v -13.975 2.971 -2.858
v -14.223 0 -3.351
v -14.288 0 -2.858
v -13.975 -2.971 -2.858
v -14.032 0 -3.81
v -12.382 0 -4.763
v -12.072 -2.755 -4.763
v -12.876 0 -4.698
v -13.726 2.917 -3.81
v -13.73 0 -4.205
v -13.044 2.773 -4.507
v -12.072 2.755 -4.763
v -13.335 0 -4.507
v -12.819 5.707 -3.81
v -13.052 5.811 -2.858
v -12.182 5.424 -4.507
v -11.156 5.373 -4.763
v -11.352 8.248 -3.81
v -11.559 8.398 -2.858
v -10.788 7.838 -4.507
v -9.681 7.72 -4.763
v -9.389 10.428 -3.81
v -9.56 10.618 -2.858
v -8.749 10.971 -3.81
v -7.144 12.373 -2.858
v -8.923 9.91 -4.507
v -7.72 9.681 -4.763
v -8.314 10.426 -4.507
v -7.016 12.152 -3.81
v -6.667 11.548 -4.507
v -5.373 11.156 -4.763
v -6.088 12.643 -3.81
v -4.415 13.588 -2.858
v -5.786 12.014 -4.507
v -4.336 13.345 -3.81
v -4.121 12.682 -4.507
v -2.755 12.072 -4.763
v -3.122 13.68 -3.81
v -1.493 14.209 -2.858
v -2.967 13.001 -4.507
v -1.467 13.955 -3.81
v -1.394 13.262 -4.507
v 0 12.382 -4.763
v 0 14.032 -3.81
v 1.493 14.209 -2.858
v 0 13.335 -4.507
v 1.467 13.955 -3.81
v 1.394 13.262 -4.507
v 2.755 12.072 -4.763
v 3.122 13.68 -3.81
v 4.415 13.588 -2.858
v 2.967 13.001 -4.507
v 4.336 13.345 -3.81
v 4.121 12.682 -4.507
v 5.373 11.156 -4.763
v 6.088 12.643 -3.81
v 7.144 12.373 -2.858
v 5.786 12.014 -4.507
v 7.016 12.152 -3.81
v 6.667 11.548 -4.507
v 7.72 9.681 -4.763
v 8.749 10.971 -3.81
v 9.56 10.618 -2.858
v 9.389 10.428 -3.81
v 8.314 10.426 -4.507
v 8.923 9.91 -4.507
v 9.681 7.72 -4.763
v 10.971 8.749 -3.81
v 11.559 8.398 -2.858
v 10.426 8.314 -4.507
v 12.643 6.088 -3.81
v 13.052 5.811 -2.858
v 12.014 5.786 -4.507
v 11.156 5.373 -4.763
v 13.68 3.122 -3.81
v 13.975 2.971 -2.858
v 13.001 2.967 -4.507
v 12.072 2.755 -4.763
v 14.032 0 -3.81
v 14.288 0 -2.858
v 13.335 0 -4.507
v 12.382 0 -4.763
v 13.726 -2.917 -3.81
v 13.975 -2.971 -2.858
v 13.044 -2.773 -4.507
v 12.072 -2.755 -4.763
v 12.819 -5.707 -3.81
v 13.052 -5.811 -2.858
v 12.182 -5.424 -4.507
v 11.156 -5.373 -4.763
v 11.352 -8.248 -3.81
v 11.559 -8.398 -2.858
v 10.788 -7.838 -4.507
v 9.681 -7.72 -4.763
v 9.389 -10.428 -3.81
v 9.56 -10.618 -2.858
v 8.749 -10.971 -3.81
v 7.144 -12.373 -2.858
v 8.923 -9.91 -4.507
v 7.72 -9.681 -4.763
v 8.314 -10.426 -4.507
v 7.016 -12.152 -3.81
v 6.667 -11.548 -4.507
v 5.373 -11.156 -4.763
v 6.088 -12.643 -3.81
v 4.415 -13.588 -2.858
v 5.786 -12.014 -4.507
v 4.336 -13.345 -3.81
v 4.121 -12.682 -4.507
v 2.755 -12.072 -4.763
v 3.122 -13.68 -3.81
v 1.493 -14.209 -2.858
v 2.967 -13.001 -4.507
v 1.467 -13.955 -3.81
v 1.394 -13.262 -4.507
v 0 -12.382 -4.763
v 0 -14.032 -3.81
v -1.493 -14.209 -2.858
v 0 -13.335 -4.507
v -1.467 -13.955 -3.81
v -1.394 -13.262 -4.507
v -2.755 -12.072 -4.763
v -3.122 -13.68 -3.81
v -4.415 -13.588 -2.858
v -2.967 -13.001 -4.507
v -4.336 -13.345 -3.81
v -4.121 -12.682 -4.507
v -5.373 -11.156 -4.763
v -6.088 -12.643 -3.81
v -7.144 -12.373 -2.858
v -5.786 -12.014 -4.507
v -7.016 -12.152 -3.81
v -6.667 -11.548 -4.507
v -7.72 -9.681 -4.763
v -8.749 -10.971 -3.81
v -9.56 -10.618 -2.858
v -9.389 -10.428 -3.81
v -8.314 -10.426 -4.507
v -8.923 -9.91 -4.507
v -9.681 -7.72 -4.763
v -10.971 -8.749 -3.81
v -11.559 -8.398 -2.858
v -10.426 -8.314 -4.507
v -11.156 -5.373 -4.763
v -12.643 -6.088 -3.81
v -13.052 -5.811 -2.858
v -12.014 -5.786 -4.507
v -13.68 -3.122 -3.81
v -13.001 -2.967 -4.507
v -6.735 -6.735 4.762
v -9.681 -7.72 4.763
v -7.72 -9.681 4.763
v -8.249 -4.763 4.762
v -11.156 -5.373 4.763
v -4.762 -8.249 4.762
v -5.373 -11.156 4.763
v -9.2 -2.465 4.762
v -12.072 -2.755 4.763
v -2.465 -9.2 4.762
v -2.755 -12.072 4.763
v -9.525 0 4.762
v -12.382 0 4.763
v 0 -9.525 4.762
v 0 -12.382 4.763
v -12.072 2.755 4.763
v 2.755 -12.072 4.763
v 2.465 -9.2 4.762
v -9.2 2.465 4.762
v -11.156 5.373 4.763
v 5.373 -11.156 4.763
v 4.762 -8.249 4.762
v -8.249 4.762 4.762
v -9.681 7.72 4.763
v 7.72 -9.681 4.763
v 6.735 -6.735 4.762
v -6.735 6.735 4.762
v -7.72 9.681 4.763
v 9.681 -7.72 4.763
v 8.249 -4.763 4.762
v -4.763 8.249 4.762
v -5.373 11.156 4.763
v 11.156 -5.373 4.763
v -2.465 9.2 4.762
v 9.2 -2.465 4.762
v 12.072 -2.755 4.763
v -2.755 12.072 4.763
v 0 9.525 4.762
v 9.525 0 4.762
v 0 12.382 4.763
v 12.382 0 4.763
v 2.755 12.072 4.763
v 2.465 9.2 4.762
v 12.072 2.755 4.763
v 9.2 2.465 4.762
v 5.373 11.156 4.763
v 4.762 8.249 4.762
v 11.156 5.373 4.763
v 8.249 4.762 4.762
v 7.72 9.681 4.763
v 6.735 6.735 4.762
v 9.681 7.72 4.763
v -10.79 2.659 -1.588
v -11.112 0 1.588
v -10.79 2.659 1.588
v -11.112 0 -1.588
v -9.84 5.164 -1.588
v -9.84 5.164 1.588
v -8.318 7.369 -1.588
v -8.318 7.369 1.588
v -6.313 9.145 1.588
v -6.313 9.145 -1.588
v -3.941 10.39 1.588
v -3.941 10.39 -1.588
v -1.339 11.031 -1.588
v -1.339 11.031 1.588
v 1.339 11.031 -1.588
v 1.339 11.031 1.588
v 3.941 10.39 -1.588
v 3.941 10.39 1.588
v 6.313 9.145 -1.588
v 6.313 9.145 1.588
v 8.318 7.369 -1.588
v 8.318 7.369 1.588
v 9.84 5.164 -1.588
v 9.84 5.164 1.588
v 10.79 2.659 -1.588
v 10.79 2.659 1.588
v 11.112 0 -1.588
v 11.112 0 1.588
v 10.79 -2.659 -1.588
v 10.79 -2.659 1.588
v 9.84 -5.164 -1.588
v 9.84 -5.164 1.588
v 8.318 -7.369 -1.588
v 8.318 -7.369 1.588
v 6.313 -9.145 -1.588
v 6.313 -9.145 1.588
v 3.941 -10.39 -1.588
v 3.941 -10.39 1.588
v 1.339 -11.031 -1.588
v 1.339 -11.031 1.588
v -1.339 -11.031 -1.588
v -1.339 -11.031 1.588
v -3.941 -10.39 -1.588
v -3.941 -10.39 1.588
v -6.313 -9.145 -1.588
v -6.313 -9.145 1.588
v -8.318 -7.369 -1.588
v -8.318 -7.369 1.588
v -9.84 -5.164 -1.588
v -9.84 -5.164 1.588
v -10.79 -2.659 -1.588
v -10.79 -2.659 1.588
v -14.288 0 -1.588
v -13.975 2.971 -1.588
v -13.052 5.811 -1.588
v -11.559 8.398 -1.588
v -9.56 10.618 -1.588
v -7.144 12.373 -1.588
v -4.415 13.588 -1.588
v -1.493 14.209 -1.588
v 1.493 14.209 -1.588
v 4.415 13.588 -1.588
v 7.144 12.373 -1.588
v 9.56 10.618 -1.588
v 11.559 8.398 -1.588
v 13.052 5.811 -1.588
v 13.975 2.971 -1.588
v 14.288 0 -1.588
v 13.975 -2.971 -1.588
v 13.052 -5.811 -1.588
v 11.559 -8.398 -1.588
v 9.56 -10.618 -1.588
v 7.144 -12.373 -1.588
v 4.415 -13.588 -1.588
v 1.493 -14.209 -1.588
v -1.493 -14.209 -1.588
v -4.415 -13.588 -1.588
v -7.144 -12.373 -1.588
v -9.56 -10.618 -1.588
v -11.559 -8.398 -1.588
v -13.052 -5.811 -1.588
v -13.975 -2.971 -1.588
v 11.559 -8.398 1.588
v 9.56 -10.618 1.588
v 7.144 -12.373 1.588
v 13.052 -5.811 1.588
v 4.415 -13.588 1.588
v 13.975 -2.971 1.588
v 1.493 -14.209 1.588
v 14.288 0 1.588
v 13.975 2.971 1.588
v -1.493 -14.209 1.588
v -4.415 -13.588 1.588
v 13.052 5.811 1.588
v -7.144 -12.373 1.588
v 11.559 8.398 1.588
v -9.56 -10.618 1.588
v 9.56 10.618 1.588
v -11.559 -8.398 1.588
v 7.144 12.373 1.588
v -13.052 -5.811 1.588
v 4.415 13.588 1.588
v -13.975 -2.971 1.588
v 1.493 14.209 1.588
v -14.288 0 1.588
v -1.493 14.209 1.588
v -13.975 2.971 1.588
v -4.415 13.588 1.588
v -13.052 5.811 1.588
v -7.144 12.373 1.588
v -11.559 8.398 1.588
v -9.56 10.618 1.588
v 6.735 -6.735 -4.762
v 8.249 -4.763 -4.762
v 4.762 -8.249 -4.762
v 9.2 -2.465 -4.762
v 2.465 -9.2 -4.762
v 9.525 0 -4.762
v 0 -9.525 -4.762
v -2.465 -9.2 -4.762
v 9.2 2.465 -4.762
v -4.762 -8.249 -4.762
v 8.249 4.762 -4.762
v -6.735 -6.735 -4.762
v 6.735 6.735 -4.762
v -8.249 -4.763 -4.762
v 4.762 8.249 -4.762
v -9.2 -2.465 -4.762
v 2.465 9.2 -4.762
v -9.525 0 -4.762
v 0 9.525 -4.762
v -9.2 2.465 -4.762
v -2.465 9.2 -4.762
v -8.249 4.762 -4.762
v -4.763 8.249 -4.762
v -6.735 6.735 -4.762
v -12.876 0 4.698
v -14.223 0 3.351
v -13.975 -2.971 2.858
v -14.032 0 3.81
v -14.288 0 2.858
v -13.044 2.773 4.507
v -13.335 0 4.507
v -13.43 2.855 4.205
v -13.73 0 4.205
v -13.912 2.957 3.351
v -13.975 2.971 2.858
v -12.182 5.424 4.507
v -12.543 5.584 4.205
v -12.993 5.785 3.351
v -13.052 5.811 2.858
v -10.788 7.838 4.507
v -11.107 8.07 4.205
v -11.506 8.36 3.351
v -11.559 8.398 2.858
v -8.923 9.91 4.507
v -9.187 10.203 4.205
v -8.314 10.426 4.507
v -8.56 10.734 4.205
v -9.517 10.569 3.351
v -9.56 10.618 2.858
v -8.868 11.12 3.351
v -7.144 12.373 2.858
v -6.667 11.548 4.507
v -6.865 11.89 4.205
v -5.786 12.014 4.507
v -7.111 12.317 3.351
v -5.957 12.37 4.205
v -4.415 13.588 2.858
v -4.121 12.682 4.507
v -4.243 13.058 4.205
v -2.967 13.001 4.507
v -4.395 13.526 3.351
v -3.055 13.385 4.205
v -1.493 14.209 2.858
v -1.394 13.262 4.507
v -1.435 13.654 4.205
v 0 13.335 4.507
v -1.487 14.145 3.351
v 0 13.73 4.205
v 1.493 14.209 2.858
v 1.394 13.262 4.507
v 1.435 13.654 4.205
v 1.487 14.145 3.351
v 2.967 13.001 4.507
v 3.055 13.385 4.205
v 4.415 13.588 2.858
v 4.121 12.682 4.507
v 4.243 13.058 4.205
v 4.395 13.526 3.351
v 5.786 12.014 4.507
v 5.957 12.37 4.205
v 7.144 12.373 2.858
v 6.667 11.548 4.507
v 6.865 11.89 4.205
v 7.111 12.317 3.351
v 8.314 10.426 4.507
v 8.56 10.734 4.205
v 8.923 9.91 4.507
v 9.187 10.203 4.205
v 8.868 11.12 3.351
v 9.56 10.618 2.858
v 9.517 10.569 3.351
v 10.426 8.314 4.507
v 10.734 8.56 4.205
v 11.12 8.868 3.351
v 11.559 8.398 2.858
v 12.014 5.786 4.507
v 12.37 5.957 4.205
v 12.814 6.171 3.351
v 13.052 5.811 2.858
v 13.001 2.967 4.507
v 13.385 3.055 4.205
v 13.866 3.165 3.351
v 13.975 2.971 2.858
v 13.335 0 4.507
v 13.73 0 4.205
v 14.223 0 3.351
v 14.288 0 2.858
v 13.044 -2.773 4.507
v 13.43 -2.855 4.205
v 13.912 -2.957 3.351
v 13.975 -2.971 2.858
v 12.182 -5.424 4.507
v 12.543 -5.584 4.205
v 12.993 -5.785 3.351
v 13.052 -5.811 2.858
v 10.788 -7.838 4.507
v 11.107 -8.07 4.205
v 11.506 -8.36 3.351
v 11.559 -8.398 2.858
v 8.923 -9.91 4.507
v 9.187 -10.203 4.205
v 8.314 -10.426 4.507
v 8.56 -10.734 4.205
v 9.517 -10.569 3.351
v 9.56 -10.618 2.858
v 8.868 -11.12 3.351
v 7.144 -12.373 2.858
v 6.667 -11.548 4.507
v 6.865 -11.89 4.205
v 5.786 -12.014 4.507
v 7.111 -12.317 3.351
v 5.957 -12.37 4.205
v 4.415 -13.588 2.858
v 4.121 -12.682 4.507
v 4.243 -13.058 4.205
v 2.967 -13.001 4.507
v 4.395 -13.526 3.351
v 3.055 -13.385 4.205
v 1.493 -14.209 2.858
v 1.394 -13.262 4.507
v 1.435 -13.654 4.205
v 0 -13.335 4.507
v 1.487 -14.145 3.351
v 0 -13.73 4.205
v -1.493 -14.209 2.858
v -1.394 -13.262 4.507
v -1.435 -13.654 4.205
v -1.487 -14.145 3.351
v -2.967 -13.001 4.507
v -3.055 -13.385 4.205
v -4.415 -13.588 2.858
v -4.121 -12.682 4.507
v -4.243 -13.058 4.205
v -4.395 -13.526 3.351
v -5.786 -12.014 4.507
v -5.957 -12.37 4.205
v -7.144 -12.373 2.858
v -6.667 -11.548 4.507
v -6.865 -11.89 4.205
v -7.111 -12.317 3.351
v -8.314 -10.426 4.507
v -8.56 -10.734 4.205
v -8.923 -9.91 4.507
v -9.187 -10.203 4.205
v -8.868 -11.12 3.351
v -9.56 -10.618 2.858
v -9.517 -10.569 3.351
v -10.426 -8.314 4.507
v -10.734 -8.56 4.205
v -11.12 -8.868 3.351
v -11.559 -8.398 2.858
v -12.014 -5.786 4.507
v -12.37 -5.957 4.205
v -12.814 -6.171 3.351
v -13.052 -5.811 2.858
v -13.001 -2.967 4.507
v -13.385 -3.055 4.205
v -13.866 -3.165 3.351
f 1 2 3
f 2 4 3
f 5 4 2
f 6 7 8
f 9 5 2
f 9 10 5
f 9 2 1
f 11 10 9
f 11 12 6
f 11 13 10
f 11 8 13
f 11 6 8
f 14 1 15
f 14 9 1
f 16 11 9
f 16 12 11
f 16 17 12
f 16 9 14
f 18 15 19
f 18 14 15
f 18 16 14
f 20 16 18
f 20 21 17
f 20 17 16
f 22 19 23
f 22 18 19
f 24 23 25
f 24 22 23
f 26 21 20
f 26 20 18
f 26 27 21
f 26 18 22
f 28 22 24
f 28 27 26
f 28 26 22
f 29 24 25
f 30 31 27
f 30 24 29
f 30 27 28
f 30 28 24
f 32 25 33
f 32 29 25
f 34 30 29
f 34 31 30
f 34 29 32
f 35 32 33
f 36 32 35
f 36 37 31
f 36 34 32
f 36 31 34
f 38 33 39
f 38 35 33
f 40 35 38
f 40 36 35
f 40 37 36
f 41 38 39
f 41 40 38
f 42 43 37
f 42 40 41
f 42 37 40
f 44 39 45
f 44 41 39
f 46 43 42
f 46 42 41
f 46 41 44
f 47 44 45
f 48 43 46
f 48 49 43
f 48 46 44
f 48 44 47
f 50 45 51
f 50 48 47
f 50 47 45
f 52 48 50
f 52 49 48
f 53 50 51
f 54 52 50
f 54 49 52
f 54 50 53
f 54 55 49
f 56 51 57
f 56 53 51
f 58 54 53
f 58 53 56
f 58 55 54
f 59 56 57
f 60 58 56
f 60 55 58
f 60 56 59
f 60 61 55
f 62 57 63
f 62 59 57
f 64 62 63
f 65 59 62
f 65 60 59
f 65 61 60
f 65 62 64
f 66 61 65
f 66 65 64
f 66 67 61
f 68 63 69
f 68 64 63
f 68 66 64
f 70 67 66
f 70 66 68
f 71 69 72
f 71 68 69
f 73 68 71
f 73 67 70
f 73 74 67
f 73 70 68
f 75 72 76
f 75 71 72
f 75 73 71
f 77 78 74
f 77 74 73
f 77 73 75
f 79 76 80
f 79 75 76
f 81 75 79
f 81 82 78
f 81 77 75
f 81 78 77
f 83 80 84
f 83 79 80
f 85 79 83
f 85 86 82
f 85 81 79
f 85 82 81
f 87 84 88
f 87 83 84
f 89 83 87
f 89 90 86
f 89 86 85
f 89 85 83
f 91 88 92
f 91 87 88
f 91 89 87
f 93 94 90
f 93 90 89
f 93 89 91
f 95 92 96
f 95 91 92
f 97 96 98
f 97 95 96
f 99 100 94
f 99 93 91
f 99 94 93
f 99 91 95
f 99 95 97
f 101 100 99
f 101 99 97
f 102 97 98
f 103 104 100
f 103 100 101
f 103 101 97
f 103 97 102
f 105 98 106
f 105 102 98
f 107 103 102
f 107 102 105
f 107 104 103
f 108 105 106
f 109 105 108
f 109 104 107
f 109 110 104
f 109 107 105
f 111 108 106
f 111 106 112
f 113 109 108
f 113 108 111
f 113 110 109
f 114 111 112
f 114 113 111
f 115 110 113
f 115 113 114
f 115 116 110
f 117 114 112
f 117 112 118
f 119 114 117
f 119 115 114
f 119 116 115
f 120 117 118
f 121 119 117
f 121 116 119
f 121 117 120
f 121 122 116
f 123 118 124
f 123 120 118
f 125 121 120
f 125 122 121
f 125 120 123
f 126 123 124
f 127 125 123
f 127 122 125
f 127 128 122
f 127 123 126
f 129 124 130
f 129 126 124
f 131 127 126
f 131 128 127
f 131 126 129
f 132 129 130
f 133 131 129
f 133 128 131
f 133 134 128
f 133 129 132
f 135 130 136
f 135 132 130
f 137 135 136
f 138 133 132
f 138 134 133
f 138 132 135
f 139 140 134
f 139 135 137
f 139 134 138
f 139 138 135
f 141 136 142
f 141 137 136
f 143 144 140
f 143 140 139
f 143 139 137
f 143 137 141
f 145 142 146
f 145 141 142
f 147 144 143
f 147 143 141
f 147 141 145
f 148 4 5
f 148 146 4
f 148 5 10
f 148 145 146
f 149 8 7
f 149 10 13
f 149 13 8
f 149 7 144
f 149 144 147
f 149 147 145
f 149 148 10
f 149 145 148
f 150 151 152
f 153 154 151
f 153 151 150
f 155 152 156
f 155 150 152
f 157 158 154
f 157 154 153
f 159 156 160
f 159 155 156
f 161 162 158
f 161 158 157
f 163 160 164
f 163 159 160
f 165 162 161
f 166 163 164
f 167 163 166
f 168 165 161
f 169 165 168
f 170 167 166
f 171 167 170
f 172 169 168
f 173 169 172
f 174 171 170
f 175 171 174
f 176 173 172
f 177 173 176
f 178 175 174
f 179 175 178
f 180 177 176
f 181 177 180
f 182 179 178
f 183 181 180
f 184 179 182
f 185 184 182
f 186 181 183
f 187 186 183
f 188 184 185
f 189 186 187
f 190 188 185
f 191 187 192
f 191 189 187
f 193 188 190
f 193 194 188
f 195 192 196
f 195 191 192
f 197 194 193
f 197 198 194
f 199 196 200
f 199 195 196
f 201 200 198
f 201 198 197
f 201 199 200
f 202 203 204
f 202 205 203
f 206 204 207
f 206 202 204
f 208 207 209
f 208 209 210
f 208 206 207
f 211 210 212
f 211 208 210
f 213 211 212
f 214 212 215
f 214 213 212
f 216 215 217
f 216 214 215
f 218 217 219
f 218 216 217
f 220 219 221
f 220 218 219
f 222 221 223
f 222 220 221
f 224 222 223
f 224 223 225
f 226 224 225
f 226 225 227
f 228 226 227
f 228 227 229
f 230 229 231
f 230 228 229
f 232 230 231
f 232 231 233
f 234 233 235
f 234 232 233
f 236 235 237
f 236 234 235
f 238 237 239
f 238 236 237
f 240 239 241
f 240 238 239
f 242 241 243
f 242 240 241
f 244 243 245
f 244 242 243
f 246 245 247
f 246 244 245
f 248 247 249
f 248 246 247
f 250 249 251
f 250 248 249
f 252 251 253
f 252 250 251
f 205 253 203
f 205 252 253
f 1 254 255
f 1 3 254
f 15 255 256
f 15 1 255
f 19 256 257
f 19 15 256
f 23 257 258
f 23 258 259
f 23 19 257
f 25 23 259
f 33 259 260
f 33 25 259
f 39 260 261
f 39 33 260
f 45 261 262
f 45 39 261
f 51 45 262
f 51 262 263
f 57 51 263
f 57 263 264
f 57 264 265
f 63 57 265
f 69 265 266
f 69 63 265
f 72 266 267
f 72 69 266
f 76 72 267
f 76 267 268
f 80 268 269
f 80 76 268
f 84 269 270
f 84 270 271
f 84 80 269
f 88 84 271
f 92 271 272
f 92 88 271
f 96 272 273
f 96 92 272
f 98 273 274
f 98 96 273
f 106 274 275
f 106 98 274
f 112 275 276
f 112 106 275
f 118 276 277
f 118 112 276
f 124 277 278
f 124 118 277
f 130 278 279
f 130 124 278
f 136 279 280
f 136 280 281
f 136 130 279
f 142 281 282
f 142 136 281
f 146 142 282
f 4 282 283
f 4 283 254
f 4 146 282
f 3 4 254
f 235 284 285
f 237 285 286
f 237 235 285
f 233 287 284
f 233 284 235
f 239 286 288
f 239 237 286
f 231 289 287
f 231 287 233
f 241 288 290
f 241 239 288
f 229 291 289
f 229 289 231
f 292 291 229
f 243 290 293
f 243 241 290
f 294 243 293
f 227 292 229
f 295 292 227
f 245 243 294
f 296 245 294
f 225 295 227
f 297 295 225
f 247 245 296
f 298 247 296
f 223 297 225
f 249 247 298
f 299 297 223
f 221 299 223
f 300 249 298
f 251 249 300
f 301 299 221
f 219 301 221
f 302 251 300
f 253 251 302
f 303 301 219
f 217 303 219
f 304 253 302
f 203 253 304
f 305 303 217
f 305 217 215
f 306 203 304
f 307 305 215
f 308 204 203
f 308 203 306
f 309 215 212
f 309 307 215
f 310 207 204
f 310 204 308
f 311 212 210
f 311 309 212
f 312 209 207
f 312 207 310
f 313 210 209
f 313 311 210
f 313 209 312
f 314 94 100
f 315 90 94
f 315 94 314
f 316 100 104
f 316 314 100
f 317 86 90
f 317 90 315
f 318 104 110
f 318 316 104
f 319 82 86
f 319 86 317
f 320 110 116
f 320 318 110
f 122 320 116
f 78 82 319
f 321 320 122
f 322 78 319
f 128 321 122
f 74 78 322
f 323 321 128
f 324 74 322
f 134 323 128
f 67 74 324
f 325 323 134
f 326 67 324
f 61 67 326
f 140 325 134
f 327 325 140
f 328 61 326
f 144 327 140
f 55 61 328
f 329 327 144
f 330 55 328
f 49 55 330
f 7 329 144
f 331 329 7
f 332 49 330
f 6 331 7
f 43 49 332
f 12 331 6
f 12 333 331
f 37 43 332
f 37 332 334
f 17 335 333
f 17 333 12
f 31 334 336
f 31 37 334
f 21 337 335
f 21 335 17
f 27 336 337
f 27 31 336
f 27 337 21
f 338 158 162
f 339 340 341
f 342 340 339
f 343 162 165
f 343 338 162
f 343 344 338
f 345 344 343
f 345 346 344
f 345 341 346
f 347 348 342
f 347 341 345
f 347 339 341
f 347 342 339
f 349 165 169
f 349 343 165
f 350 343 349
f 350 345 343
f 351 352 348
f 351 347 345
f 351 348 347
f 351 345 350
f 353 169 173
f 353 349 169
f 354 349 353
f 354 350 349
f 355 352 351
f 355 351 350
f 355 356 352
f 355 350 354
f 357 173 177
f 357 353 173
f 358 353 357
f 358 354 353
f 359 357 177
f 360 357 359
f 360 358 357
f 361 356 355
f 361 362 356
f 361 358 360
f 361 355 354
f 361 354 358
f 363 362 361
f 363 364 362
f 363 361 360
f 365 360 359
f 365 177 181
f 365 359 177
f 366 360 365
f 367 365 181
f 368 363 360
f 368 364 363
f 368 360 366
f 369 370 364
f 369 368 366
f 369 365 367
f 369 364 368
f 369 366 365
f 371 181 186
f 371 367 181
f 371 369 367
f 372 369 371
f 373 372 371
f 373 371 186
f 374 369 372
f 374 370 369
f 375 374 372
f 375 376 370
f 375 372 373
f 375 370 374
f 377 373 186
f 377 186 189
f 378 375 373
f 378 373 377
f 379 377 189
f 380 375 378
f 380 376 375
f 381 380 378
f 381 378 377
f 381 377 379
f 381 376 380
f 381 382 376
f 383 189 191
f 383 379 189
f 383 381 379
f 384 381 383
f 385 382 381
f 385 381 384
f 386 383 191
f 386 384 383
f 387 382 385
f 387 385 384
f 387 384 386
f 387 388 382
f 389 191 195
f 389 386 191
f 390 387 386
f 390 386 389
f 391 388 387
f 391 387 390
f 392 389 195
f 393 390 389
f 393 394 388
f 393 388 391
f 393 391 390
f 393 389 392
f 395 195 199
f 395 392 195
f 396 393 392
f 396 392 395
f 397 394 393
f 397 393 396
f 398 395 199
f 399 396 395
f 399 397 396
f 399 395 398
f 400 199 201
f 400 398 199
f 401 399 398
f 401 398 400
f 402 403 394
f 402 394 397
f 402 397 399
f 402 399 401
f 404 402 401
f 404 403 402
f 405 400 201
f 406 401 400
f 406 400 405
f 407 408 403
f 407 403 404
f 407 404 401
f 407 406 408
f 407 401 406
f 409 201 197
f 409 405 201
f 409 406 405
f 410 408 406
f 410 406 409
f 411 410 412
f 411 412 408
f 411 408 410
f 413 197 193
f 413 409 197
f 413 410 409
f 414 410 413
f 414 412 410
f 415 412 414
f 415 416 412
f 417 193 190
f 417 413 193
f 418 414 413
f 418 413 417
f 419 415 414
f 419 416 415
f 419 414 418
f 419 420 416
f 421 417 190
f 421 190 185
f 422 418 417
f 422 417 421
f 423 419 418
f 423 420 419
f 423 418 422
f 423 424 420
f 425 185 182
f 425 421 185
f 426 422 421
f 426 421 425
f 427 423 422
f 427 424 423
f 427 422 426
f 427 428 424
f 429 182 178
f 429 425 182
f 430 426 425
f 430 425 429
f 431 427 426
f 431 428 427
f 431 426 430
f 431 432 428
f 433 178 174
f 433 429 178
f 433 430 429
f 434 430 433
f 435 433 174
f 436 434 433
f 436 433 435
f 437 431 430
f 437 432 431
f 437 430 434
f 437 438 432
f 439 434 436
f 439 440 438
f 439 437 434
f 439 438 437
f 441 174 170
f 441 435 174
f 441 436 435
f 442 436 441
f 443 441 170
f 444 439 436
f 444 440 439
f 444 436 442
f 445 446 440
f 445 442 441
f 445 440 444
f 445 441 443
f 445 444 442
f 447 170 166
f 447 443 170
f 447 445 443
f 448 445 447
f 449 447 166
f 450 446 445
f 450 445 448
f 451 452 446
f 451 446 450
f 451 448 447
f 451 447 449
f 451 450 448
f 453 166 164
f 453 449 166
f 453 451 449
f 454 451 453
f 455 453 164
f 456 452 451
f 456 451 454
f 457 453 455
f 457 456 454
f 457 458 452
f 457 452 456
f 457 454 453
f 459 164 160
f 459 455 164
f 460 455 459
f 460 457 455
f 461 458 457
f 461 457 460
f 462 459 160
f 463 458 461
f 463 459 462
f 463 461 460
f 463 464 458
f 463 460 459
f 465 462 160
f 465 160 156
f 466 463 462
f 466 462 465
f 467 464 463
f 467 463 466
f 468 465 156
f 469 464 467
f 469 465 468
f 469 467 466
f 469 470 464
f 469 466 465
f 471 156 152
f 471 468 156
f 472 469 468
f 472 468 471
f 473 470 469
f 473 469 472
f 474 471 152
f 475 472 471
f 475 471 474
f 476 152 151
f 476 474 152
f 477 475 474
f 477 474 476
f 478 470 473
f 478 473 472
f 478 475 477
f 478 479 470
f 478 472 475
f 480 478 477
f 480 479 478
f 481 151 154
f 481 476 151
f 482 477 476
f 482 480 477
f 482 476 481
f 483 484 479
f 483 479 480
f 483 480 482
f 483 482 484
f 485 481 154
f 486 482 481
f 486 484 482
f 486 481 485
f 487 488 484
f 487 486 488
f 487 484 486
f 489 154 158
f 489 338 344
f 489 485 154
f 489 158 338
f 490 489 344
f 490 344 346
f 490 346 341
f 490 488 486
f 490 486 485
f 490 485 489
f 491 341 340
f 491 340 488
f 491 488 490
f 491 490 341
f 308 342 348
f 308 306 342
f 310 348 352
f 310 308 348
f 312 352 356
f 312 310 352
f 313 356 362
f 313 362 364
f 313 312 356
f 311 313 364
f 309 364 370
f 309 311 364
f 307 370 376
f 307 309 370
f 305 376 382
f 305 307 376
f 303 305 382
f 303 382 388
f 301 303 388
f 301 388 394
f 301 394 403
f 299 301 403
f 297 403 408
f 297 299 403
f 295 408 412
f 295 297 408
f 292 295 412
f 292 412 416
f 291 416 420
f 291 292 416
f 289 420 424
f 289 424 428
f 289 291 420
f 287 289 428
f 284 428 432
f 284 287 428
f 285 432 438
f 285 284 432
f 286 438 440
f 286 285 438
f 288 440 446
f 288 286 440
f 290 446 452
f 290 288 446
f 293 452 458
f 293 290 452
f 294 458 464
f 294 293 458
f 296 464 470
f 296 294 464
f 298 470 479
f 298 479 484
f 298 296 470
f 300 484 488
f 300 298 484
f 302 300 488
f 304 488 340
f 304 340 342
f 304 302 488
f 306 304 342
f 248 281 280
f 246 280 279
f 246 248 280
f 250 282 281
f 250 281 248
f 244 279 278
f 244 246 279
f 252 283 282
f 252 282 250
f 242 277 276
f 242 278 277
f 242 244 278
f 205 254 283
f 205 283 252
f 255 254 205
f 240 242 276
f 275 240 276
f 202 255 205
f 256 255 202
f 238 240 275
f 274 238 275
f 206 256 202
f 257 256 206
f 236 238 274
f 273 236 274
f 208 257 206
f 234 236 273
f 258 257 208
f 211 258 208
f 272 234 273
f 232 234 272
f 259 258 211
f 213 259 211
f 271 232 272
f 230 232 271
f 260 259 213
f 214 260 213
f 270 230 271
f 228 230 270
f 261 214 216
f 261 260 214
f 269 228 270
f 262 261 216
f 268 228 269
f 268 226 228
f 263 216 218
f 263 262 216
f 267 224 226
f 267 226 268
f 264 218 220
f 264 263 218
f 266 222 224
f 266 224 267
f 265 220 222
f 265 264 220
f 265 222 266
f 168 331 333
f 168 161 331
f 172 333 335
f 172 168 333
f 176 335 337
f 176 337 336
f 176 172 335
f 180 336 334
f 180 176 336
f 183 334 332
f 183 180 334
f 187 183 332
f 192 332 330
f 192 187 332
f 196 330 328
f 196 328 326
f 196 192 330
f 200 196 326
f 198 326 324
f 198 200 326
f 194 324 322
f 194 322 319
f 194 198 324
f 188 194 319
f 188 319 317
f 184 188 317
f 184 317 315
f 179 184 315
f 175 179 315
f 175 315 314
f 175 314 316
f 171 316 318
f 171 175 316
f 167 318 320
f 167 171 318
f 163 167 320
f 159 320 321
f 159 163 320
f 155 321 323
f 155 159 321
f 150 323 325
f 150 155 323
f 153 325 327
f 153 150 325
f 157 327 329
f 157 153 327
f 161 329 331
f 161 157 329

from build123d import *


with BuildPart() as f1:
    # F0 (on Front) → F1 (revolve)
    with BuildSketch(Plane.XZ):
        with BuildLine():
            Line((-9.525, 4.7625), (-12.3825, 4.7625))
            ThreePointArc((-12.3825, 4.7625), (-13.729538, 4.204538), (-14.2875, 2.8575))
            Line((-14.2875, 2.8575), (-14.2875, 1.5875))
            Line((-14.2875, 1.5875), (-11.1125, 1.5875))
            Line((-11.1125, 1.5875), (-11.1125, -1.5875))
            Line((-11.1125, -1.5875), (-14.2875, -1.5875))
            Line((-14.2875, -1.5875), (-14.2875, -2.8575))
            ThreePointArc((-14.2875, -2.8575), (-13.729538, -4.204538), (-12.3825, -4.7625))
            Line((-12.3825, -4.7625), (-9.525, -4.7625))
            Line((-9.525, -4.7625), (-9.525, 4.7625))
        make_face()
    revolve(axis=Axis((0, 0, -0.259772), (0, 0, -1)))


solid = f1.part
